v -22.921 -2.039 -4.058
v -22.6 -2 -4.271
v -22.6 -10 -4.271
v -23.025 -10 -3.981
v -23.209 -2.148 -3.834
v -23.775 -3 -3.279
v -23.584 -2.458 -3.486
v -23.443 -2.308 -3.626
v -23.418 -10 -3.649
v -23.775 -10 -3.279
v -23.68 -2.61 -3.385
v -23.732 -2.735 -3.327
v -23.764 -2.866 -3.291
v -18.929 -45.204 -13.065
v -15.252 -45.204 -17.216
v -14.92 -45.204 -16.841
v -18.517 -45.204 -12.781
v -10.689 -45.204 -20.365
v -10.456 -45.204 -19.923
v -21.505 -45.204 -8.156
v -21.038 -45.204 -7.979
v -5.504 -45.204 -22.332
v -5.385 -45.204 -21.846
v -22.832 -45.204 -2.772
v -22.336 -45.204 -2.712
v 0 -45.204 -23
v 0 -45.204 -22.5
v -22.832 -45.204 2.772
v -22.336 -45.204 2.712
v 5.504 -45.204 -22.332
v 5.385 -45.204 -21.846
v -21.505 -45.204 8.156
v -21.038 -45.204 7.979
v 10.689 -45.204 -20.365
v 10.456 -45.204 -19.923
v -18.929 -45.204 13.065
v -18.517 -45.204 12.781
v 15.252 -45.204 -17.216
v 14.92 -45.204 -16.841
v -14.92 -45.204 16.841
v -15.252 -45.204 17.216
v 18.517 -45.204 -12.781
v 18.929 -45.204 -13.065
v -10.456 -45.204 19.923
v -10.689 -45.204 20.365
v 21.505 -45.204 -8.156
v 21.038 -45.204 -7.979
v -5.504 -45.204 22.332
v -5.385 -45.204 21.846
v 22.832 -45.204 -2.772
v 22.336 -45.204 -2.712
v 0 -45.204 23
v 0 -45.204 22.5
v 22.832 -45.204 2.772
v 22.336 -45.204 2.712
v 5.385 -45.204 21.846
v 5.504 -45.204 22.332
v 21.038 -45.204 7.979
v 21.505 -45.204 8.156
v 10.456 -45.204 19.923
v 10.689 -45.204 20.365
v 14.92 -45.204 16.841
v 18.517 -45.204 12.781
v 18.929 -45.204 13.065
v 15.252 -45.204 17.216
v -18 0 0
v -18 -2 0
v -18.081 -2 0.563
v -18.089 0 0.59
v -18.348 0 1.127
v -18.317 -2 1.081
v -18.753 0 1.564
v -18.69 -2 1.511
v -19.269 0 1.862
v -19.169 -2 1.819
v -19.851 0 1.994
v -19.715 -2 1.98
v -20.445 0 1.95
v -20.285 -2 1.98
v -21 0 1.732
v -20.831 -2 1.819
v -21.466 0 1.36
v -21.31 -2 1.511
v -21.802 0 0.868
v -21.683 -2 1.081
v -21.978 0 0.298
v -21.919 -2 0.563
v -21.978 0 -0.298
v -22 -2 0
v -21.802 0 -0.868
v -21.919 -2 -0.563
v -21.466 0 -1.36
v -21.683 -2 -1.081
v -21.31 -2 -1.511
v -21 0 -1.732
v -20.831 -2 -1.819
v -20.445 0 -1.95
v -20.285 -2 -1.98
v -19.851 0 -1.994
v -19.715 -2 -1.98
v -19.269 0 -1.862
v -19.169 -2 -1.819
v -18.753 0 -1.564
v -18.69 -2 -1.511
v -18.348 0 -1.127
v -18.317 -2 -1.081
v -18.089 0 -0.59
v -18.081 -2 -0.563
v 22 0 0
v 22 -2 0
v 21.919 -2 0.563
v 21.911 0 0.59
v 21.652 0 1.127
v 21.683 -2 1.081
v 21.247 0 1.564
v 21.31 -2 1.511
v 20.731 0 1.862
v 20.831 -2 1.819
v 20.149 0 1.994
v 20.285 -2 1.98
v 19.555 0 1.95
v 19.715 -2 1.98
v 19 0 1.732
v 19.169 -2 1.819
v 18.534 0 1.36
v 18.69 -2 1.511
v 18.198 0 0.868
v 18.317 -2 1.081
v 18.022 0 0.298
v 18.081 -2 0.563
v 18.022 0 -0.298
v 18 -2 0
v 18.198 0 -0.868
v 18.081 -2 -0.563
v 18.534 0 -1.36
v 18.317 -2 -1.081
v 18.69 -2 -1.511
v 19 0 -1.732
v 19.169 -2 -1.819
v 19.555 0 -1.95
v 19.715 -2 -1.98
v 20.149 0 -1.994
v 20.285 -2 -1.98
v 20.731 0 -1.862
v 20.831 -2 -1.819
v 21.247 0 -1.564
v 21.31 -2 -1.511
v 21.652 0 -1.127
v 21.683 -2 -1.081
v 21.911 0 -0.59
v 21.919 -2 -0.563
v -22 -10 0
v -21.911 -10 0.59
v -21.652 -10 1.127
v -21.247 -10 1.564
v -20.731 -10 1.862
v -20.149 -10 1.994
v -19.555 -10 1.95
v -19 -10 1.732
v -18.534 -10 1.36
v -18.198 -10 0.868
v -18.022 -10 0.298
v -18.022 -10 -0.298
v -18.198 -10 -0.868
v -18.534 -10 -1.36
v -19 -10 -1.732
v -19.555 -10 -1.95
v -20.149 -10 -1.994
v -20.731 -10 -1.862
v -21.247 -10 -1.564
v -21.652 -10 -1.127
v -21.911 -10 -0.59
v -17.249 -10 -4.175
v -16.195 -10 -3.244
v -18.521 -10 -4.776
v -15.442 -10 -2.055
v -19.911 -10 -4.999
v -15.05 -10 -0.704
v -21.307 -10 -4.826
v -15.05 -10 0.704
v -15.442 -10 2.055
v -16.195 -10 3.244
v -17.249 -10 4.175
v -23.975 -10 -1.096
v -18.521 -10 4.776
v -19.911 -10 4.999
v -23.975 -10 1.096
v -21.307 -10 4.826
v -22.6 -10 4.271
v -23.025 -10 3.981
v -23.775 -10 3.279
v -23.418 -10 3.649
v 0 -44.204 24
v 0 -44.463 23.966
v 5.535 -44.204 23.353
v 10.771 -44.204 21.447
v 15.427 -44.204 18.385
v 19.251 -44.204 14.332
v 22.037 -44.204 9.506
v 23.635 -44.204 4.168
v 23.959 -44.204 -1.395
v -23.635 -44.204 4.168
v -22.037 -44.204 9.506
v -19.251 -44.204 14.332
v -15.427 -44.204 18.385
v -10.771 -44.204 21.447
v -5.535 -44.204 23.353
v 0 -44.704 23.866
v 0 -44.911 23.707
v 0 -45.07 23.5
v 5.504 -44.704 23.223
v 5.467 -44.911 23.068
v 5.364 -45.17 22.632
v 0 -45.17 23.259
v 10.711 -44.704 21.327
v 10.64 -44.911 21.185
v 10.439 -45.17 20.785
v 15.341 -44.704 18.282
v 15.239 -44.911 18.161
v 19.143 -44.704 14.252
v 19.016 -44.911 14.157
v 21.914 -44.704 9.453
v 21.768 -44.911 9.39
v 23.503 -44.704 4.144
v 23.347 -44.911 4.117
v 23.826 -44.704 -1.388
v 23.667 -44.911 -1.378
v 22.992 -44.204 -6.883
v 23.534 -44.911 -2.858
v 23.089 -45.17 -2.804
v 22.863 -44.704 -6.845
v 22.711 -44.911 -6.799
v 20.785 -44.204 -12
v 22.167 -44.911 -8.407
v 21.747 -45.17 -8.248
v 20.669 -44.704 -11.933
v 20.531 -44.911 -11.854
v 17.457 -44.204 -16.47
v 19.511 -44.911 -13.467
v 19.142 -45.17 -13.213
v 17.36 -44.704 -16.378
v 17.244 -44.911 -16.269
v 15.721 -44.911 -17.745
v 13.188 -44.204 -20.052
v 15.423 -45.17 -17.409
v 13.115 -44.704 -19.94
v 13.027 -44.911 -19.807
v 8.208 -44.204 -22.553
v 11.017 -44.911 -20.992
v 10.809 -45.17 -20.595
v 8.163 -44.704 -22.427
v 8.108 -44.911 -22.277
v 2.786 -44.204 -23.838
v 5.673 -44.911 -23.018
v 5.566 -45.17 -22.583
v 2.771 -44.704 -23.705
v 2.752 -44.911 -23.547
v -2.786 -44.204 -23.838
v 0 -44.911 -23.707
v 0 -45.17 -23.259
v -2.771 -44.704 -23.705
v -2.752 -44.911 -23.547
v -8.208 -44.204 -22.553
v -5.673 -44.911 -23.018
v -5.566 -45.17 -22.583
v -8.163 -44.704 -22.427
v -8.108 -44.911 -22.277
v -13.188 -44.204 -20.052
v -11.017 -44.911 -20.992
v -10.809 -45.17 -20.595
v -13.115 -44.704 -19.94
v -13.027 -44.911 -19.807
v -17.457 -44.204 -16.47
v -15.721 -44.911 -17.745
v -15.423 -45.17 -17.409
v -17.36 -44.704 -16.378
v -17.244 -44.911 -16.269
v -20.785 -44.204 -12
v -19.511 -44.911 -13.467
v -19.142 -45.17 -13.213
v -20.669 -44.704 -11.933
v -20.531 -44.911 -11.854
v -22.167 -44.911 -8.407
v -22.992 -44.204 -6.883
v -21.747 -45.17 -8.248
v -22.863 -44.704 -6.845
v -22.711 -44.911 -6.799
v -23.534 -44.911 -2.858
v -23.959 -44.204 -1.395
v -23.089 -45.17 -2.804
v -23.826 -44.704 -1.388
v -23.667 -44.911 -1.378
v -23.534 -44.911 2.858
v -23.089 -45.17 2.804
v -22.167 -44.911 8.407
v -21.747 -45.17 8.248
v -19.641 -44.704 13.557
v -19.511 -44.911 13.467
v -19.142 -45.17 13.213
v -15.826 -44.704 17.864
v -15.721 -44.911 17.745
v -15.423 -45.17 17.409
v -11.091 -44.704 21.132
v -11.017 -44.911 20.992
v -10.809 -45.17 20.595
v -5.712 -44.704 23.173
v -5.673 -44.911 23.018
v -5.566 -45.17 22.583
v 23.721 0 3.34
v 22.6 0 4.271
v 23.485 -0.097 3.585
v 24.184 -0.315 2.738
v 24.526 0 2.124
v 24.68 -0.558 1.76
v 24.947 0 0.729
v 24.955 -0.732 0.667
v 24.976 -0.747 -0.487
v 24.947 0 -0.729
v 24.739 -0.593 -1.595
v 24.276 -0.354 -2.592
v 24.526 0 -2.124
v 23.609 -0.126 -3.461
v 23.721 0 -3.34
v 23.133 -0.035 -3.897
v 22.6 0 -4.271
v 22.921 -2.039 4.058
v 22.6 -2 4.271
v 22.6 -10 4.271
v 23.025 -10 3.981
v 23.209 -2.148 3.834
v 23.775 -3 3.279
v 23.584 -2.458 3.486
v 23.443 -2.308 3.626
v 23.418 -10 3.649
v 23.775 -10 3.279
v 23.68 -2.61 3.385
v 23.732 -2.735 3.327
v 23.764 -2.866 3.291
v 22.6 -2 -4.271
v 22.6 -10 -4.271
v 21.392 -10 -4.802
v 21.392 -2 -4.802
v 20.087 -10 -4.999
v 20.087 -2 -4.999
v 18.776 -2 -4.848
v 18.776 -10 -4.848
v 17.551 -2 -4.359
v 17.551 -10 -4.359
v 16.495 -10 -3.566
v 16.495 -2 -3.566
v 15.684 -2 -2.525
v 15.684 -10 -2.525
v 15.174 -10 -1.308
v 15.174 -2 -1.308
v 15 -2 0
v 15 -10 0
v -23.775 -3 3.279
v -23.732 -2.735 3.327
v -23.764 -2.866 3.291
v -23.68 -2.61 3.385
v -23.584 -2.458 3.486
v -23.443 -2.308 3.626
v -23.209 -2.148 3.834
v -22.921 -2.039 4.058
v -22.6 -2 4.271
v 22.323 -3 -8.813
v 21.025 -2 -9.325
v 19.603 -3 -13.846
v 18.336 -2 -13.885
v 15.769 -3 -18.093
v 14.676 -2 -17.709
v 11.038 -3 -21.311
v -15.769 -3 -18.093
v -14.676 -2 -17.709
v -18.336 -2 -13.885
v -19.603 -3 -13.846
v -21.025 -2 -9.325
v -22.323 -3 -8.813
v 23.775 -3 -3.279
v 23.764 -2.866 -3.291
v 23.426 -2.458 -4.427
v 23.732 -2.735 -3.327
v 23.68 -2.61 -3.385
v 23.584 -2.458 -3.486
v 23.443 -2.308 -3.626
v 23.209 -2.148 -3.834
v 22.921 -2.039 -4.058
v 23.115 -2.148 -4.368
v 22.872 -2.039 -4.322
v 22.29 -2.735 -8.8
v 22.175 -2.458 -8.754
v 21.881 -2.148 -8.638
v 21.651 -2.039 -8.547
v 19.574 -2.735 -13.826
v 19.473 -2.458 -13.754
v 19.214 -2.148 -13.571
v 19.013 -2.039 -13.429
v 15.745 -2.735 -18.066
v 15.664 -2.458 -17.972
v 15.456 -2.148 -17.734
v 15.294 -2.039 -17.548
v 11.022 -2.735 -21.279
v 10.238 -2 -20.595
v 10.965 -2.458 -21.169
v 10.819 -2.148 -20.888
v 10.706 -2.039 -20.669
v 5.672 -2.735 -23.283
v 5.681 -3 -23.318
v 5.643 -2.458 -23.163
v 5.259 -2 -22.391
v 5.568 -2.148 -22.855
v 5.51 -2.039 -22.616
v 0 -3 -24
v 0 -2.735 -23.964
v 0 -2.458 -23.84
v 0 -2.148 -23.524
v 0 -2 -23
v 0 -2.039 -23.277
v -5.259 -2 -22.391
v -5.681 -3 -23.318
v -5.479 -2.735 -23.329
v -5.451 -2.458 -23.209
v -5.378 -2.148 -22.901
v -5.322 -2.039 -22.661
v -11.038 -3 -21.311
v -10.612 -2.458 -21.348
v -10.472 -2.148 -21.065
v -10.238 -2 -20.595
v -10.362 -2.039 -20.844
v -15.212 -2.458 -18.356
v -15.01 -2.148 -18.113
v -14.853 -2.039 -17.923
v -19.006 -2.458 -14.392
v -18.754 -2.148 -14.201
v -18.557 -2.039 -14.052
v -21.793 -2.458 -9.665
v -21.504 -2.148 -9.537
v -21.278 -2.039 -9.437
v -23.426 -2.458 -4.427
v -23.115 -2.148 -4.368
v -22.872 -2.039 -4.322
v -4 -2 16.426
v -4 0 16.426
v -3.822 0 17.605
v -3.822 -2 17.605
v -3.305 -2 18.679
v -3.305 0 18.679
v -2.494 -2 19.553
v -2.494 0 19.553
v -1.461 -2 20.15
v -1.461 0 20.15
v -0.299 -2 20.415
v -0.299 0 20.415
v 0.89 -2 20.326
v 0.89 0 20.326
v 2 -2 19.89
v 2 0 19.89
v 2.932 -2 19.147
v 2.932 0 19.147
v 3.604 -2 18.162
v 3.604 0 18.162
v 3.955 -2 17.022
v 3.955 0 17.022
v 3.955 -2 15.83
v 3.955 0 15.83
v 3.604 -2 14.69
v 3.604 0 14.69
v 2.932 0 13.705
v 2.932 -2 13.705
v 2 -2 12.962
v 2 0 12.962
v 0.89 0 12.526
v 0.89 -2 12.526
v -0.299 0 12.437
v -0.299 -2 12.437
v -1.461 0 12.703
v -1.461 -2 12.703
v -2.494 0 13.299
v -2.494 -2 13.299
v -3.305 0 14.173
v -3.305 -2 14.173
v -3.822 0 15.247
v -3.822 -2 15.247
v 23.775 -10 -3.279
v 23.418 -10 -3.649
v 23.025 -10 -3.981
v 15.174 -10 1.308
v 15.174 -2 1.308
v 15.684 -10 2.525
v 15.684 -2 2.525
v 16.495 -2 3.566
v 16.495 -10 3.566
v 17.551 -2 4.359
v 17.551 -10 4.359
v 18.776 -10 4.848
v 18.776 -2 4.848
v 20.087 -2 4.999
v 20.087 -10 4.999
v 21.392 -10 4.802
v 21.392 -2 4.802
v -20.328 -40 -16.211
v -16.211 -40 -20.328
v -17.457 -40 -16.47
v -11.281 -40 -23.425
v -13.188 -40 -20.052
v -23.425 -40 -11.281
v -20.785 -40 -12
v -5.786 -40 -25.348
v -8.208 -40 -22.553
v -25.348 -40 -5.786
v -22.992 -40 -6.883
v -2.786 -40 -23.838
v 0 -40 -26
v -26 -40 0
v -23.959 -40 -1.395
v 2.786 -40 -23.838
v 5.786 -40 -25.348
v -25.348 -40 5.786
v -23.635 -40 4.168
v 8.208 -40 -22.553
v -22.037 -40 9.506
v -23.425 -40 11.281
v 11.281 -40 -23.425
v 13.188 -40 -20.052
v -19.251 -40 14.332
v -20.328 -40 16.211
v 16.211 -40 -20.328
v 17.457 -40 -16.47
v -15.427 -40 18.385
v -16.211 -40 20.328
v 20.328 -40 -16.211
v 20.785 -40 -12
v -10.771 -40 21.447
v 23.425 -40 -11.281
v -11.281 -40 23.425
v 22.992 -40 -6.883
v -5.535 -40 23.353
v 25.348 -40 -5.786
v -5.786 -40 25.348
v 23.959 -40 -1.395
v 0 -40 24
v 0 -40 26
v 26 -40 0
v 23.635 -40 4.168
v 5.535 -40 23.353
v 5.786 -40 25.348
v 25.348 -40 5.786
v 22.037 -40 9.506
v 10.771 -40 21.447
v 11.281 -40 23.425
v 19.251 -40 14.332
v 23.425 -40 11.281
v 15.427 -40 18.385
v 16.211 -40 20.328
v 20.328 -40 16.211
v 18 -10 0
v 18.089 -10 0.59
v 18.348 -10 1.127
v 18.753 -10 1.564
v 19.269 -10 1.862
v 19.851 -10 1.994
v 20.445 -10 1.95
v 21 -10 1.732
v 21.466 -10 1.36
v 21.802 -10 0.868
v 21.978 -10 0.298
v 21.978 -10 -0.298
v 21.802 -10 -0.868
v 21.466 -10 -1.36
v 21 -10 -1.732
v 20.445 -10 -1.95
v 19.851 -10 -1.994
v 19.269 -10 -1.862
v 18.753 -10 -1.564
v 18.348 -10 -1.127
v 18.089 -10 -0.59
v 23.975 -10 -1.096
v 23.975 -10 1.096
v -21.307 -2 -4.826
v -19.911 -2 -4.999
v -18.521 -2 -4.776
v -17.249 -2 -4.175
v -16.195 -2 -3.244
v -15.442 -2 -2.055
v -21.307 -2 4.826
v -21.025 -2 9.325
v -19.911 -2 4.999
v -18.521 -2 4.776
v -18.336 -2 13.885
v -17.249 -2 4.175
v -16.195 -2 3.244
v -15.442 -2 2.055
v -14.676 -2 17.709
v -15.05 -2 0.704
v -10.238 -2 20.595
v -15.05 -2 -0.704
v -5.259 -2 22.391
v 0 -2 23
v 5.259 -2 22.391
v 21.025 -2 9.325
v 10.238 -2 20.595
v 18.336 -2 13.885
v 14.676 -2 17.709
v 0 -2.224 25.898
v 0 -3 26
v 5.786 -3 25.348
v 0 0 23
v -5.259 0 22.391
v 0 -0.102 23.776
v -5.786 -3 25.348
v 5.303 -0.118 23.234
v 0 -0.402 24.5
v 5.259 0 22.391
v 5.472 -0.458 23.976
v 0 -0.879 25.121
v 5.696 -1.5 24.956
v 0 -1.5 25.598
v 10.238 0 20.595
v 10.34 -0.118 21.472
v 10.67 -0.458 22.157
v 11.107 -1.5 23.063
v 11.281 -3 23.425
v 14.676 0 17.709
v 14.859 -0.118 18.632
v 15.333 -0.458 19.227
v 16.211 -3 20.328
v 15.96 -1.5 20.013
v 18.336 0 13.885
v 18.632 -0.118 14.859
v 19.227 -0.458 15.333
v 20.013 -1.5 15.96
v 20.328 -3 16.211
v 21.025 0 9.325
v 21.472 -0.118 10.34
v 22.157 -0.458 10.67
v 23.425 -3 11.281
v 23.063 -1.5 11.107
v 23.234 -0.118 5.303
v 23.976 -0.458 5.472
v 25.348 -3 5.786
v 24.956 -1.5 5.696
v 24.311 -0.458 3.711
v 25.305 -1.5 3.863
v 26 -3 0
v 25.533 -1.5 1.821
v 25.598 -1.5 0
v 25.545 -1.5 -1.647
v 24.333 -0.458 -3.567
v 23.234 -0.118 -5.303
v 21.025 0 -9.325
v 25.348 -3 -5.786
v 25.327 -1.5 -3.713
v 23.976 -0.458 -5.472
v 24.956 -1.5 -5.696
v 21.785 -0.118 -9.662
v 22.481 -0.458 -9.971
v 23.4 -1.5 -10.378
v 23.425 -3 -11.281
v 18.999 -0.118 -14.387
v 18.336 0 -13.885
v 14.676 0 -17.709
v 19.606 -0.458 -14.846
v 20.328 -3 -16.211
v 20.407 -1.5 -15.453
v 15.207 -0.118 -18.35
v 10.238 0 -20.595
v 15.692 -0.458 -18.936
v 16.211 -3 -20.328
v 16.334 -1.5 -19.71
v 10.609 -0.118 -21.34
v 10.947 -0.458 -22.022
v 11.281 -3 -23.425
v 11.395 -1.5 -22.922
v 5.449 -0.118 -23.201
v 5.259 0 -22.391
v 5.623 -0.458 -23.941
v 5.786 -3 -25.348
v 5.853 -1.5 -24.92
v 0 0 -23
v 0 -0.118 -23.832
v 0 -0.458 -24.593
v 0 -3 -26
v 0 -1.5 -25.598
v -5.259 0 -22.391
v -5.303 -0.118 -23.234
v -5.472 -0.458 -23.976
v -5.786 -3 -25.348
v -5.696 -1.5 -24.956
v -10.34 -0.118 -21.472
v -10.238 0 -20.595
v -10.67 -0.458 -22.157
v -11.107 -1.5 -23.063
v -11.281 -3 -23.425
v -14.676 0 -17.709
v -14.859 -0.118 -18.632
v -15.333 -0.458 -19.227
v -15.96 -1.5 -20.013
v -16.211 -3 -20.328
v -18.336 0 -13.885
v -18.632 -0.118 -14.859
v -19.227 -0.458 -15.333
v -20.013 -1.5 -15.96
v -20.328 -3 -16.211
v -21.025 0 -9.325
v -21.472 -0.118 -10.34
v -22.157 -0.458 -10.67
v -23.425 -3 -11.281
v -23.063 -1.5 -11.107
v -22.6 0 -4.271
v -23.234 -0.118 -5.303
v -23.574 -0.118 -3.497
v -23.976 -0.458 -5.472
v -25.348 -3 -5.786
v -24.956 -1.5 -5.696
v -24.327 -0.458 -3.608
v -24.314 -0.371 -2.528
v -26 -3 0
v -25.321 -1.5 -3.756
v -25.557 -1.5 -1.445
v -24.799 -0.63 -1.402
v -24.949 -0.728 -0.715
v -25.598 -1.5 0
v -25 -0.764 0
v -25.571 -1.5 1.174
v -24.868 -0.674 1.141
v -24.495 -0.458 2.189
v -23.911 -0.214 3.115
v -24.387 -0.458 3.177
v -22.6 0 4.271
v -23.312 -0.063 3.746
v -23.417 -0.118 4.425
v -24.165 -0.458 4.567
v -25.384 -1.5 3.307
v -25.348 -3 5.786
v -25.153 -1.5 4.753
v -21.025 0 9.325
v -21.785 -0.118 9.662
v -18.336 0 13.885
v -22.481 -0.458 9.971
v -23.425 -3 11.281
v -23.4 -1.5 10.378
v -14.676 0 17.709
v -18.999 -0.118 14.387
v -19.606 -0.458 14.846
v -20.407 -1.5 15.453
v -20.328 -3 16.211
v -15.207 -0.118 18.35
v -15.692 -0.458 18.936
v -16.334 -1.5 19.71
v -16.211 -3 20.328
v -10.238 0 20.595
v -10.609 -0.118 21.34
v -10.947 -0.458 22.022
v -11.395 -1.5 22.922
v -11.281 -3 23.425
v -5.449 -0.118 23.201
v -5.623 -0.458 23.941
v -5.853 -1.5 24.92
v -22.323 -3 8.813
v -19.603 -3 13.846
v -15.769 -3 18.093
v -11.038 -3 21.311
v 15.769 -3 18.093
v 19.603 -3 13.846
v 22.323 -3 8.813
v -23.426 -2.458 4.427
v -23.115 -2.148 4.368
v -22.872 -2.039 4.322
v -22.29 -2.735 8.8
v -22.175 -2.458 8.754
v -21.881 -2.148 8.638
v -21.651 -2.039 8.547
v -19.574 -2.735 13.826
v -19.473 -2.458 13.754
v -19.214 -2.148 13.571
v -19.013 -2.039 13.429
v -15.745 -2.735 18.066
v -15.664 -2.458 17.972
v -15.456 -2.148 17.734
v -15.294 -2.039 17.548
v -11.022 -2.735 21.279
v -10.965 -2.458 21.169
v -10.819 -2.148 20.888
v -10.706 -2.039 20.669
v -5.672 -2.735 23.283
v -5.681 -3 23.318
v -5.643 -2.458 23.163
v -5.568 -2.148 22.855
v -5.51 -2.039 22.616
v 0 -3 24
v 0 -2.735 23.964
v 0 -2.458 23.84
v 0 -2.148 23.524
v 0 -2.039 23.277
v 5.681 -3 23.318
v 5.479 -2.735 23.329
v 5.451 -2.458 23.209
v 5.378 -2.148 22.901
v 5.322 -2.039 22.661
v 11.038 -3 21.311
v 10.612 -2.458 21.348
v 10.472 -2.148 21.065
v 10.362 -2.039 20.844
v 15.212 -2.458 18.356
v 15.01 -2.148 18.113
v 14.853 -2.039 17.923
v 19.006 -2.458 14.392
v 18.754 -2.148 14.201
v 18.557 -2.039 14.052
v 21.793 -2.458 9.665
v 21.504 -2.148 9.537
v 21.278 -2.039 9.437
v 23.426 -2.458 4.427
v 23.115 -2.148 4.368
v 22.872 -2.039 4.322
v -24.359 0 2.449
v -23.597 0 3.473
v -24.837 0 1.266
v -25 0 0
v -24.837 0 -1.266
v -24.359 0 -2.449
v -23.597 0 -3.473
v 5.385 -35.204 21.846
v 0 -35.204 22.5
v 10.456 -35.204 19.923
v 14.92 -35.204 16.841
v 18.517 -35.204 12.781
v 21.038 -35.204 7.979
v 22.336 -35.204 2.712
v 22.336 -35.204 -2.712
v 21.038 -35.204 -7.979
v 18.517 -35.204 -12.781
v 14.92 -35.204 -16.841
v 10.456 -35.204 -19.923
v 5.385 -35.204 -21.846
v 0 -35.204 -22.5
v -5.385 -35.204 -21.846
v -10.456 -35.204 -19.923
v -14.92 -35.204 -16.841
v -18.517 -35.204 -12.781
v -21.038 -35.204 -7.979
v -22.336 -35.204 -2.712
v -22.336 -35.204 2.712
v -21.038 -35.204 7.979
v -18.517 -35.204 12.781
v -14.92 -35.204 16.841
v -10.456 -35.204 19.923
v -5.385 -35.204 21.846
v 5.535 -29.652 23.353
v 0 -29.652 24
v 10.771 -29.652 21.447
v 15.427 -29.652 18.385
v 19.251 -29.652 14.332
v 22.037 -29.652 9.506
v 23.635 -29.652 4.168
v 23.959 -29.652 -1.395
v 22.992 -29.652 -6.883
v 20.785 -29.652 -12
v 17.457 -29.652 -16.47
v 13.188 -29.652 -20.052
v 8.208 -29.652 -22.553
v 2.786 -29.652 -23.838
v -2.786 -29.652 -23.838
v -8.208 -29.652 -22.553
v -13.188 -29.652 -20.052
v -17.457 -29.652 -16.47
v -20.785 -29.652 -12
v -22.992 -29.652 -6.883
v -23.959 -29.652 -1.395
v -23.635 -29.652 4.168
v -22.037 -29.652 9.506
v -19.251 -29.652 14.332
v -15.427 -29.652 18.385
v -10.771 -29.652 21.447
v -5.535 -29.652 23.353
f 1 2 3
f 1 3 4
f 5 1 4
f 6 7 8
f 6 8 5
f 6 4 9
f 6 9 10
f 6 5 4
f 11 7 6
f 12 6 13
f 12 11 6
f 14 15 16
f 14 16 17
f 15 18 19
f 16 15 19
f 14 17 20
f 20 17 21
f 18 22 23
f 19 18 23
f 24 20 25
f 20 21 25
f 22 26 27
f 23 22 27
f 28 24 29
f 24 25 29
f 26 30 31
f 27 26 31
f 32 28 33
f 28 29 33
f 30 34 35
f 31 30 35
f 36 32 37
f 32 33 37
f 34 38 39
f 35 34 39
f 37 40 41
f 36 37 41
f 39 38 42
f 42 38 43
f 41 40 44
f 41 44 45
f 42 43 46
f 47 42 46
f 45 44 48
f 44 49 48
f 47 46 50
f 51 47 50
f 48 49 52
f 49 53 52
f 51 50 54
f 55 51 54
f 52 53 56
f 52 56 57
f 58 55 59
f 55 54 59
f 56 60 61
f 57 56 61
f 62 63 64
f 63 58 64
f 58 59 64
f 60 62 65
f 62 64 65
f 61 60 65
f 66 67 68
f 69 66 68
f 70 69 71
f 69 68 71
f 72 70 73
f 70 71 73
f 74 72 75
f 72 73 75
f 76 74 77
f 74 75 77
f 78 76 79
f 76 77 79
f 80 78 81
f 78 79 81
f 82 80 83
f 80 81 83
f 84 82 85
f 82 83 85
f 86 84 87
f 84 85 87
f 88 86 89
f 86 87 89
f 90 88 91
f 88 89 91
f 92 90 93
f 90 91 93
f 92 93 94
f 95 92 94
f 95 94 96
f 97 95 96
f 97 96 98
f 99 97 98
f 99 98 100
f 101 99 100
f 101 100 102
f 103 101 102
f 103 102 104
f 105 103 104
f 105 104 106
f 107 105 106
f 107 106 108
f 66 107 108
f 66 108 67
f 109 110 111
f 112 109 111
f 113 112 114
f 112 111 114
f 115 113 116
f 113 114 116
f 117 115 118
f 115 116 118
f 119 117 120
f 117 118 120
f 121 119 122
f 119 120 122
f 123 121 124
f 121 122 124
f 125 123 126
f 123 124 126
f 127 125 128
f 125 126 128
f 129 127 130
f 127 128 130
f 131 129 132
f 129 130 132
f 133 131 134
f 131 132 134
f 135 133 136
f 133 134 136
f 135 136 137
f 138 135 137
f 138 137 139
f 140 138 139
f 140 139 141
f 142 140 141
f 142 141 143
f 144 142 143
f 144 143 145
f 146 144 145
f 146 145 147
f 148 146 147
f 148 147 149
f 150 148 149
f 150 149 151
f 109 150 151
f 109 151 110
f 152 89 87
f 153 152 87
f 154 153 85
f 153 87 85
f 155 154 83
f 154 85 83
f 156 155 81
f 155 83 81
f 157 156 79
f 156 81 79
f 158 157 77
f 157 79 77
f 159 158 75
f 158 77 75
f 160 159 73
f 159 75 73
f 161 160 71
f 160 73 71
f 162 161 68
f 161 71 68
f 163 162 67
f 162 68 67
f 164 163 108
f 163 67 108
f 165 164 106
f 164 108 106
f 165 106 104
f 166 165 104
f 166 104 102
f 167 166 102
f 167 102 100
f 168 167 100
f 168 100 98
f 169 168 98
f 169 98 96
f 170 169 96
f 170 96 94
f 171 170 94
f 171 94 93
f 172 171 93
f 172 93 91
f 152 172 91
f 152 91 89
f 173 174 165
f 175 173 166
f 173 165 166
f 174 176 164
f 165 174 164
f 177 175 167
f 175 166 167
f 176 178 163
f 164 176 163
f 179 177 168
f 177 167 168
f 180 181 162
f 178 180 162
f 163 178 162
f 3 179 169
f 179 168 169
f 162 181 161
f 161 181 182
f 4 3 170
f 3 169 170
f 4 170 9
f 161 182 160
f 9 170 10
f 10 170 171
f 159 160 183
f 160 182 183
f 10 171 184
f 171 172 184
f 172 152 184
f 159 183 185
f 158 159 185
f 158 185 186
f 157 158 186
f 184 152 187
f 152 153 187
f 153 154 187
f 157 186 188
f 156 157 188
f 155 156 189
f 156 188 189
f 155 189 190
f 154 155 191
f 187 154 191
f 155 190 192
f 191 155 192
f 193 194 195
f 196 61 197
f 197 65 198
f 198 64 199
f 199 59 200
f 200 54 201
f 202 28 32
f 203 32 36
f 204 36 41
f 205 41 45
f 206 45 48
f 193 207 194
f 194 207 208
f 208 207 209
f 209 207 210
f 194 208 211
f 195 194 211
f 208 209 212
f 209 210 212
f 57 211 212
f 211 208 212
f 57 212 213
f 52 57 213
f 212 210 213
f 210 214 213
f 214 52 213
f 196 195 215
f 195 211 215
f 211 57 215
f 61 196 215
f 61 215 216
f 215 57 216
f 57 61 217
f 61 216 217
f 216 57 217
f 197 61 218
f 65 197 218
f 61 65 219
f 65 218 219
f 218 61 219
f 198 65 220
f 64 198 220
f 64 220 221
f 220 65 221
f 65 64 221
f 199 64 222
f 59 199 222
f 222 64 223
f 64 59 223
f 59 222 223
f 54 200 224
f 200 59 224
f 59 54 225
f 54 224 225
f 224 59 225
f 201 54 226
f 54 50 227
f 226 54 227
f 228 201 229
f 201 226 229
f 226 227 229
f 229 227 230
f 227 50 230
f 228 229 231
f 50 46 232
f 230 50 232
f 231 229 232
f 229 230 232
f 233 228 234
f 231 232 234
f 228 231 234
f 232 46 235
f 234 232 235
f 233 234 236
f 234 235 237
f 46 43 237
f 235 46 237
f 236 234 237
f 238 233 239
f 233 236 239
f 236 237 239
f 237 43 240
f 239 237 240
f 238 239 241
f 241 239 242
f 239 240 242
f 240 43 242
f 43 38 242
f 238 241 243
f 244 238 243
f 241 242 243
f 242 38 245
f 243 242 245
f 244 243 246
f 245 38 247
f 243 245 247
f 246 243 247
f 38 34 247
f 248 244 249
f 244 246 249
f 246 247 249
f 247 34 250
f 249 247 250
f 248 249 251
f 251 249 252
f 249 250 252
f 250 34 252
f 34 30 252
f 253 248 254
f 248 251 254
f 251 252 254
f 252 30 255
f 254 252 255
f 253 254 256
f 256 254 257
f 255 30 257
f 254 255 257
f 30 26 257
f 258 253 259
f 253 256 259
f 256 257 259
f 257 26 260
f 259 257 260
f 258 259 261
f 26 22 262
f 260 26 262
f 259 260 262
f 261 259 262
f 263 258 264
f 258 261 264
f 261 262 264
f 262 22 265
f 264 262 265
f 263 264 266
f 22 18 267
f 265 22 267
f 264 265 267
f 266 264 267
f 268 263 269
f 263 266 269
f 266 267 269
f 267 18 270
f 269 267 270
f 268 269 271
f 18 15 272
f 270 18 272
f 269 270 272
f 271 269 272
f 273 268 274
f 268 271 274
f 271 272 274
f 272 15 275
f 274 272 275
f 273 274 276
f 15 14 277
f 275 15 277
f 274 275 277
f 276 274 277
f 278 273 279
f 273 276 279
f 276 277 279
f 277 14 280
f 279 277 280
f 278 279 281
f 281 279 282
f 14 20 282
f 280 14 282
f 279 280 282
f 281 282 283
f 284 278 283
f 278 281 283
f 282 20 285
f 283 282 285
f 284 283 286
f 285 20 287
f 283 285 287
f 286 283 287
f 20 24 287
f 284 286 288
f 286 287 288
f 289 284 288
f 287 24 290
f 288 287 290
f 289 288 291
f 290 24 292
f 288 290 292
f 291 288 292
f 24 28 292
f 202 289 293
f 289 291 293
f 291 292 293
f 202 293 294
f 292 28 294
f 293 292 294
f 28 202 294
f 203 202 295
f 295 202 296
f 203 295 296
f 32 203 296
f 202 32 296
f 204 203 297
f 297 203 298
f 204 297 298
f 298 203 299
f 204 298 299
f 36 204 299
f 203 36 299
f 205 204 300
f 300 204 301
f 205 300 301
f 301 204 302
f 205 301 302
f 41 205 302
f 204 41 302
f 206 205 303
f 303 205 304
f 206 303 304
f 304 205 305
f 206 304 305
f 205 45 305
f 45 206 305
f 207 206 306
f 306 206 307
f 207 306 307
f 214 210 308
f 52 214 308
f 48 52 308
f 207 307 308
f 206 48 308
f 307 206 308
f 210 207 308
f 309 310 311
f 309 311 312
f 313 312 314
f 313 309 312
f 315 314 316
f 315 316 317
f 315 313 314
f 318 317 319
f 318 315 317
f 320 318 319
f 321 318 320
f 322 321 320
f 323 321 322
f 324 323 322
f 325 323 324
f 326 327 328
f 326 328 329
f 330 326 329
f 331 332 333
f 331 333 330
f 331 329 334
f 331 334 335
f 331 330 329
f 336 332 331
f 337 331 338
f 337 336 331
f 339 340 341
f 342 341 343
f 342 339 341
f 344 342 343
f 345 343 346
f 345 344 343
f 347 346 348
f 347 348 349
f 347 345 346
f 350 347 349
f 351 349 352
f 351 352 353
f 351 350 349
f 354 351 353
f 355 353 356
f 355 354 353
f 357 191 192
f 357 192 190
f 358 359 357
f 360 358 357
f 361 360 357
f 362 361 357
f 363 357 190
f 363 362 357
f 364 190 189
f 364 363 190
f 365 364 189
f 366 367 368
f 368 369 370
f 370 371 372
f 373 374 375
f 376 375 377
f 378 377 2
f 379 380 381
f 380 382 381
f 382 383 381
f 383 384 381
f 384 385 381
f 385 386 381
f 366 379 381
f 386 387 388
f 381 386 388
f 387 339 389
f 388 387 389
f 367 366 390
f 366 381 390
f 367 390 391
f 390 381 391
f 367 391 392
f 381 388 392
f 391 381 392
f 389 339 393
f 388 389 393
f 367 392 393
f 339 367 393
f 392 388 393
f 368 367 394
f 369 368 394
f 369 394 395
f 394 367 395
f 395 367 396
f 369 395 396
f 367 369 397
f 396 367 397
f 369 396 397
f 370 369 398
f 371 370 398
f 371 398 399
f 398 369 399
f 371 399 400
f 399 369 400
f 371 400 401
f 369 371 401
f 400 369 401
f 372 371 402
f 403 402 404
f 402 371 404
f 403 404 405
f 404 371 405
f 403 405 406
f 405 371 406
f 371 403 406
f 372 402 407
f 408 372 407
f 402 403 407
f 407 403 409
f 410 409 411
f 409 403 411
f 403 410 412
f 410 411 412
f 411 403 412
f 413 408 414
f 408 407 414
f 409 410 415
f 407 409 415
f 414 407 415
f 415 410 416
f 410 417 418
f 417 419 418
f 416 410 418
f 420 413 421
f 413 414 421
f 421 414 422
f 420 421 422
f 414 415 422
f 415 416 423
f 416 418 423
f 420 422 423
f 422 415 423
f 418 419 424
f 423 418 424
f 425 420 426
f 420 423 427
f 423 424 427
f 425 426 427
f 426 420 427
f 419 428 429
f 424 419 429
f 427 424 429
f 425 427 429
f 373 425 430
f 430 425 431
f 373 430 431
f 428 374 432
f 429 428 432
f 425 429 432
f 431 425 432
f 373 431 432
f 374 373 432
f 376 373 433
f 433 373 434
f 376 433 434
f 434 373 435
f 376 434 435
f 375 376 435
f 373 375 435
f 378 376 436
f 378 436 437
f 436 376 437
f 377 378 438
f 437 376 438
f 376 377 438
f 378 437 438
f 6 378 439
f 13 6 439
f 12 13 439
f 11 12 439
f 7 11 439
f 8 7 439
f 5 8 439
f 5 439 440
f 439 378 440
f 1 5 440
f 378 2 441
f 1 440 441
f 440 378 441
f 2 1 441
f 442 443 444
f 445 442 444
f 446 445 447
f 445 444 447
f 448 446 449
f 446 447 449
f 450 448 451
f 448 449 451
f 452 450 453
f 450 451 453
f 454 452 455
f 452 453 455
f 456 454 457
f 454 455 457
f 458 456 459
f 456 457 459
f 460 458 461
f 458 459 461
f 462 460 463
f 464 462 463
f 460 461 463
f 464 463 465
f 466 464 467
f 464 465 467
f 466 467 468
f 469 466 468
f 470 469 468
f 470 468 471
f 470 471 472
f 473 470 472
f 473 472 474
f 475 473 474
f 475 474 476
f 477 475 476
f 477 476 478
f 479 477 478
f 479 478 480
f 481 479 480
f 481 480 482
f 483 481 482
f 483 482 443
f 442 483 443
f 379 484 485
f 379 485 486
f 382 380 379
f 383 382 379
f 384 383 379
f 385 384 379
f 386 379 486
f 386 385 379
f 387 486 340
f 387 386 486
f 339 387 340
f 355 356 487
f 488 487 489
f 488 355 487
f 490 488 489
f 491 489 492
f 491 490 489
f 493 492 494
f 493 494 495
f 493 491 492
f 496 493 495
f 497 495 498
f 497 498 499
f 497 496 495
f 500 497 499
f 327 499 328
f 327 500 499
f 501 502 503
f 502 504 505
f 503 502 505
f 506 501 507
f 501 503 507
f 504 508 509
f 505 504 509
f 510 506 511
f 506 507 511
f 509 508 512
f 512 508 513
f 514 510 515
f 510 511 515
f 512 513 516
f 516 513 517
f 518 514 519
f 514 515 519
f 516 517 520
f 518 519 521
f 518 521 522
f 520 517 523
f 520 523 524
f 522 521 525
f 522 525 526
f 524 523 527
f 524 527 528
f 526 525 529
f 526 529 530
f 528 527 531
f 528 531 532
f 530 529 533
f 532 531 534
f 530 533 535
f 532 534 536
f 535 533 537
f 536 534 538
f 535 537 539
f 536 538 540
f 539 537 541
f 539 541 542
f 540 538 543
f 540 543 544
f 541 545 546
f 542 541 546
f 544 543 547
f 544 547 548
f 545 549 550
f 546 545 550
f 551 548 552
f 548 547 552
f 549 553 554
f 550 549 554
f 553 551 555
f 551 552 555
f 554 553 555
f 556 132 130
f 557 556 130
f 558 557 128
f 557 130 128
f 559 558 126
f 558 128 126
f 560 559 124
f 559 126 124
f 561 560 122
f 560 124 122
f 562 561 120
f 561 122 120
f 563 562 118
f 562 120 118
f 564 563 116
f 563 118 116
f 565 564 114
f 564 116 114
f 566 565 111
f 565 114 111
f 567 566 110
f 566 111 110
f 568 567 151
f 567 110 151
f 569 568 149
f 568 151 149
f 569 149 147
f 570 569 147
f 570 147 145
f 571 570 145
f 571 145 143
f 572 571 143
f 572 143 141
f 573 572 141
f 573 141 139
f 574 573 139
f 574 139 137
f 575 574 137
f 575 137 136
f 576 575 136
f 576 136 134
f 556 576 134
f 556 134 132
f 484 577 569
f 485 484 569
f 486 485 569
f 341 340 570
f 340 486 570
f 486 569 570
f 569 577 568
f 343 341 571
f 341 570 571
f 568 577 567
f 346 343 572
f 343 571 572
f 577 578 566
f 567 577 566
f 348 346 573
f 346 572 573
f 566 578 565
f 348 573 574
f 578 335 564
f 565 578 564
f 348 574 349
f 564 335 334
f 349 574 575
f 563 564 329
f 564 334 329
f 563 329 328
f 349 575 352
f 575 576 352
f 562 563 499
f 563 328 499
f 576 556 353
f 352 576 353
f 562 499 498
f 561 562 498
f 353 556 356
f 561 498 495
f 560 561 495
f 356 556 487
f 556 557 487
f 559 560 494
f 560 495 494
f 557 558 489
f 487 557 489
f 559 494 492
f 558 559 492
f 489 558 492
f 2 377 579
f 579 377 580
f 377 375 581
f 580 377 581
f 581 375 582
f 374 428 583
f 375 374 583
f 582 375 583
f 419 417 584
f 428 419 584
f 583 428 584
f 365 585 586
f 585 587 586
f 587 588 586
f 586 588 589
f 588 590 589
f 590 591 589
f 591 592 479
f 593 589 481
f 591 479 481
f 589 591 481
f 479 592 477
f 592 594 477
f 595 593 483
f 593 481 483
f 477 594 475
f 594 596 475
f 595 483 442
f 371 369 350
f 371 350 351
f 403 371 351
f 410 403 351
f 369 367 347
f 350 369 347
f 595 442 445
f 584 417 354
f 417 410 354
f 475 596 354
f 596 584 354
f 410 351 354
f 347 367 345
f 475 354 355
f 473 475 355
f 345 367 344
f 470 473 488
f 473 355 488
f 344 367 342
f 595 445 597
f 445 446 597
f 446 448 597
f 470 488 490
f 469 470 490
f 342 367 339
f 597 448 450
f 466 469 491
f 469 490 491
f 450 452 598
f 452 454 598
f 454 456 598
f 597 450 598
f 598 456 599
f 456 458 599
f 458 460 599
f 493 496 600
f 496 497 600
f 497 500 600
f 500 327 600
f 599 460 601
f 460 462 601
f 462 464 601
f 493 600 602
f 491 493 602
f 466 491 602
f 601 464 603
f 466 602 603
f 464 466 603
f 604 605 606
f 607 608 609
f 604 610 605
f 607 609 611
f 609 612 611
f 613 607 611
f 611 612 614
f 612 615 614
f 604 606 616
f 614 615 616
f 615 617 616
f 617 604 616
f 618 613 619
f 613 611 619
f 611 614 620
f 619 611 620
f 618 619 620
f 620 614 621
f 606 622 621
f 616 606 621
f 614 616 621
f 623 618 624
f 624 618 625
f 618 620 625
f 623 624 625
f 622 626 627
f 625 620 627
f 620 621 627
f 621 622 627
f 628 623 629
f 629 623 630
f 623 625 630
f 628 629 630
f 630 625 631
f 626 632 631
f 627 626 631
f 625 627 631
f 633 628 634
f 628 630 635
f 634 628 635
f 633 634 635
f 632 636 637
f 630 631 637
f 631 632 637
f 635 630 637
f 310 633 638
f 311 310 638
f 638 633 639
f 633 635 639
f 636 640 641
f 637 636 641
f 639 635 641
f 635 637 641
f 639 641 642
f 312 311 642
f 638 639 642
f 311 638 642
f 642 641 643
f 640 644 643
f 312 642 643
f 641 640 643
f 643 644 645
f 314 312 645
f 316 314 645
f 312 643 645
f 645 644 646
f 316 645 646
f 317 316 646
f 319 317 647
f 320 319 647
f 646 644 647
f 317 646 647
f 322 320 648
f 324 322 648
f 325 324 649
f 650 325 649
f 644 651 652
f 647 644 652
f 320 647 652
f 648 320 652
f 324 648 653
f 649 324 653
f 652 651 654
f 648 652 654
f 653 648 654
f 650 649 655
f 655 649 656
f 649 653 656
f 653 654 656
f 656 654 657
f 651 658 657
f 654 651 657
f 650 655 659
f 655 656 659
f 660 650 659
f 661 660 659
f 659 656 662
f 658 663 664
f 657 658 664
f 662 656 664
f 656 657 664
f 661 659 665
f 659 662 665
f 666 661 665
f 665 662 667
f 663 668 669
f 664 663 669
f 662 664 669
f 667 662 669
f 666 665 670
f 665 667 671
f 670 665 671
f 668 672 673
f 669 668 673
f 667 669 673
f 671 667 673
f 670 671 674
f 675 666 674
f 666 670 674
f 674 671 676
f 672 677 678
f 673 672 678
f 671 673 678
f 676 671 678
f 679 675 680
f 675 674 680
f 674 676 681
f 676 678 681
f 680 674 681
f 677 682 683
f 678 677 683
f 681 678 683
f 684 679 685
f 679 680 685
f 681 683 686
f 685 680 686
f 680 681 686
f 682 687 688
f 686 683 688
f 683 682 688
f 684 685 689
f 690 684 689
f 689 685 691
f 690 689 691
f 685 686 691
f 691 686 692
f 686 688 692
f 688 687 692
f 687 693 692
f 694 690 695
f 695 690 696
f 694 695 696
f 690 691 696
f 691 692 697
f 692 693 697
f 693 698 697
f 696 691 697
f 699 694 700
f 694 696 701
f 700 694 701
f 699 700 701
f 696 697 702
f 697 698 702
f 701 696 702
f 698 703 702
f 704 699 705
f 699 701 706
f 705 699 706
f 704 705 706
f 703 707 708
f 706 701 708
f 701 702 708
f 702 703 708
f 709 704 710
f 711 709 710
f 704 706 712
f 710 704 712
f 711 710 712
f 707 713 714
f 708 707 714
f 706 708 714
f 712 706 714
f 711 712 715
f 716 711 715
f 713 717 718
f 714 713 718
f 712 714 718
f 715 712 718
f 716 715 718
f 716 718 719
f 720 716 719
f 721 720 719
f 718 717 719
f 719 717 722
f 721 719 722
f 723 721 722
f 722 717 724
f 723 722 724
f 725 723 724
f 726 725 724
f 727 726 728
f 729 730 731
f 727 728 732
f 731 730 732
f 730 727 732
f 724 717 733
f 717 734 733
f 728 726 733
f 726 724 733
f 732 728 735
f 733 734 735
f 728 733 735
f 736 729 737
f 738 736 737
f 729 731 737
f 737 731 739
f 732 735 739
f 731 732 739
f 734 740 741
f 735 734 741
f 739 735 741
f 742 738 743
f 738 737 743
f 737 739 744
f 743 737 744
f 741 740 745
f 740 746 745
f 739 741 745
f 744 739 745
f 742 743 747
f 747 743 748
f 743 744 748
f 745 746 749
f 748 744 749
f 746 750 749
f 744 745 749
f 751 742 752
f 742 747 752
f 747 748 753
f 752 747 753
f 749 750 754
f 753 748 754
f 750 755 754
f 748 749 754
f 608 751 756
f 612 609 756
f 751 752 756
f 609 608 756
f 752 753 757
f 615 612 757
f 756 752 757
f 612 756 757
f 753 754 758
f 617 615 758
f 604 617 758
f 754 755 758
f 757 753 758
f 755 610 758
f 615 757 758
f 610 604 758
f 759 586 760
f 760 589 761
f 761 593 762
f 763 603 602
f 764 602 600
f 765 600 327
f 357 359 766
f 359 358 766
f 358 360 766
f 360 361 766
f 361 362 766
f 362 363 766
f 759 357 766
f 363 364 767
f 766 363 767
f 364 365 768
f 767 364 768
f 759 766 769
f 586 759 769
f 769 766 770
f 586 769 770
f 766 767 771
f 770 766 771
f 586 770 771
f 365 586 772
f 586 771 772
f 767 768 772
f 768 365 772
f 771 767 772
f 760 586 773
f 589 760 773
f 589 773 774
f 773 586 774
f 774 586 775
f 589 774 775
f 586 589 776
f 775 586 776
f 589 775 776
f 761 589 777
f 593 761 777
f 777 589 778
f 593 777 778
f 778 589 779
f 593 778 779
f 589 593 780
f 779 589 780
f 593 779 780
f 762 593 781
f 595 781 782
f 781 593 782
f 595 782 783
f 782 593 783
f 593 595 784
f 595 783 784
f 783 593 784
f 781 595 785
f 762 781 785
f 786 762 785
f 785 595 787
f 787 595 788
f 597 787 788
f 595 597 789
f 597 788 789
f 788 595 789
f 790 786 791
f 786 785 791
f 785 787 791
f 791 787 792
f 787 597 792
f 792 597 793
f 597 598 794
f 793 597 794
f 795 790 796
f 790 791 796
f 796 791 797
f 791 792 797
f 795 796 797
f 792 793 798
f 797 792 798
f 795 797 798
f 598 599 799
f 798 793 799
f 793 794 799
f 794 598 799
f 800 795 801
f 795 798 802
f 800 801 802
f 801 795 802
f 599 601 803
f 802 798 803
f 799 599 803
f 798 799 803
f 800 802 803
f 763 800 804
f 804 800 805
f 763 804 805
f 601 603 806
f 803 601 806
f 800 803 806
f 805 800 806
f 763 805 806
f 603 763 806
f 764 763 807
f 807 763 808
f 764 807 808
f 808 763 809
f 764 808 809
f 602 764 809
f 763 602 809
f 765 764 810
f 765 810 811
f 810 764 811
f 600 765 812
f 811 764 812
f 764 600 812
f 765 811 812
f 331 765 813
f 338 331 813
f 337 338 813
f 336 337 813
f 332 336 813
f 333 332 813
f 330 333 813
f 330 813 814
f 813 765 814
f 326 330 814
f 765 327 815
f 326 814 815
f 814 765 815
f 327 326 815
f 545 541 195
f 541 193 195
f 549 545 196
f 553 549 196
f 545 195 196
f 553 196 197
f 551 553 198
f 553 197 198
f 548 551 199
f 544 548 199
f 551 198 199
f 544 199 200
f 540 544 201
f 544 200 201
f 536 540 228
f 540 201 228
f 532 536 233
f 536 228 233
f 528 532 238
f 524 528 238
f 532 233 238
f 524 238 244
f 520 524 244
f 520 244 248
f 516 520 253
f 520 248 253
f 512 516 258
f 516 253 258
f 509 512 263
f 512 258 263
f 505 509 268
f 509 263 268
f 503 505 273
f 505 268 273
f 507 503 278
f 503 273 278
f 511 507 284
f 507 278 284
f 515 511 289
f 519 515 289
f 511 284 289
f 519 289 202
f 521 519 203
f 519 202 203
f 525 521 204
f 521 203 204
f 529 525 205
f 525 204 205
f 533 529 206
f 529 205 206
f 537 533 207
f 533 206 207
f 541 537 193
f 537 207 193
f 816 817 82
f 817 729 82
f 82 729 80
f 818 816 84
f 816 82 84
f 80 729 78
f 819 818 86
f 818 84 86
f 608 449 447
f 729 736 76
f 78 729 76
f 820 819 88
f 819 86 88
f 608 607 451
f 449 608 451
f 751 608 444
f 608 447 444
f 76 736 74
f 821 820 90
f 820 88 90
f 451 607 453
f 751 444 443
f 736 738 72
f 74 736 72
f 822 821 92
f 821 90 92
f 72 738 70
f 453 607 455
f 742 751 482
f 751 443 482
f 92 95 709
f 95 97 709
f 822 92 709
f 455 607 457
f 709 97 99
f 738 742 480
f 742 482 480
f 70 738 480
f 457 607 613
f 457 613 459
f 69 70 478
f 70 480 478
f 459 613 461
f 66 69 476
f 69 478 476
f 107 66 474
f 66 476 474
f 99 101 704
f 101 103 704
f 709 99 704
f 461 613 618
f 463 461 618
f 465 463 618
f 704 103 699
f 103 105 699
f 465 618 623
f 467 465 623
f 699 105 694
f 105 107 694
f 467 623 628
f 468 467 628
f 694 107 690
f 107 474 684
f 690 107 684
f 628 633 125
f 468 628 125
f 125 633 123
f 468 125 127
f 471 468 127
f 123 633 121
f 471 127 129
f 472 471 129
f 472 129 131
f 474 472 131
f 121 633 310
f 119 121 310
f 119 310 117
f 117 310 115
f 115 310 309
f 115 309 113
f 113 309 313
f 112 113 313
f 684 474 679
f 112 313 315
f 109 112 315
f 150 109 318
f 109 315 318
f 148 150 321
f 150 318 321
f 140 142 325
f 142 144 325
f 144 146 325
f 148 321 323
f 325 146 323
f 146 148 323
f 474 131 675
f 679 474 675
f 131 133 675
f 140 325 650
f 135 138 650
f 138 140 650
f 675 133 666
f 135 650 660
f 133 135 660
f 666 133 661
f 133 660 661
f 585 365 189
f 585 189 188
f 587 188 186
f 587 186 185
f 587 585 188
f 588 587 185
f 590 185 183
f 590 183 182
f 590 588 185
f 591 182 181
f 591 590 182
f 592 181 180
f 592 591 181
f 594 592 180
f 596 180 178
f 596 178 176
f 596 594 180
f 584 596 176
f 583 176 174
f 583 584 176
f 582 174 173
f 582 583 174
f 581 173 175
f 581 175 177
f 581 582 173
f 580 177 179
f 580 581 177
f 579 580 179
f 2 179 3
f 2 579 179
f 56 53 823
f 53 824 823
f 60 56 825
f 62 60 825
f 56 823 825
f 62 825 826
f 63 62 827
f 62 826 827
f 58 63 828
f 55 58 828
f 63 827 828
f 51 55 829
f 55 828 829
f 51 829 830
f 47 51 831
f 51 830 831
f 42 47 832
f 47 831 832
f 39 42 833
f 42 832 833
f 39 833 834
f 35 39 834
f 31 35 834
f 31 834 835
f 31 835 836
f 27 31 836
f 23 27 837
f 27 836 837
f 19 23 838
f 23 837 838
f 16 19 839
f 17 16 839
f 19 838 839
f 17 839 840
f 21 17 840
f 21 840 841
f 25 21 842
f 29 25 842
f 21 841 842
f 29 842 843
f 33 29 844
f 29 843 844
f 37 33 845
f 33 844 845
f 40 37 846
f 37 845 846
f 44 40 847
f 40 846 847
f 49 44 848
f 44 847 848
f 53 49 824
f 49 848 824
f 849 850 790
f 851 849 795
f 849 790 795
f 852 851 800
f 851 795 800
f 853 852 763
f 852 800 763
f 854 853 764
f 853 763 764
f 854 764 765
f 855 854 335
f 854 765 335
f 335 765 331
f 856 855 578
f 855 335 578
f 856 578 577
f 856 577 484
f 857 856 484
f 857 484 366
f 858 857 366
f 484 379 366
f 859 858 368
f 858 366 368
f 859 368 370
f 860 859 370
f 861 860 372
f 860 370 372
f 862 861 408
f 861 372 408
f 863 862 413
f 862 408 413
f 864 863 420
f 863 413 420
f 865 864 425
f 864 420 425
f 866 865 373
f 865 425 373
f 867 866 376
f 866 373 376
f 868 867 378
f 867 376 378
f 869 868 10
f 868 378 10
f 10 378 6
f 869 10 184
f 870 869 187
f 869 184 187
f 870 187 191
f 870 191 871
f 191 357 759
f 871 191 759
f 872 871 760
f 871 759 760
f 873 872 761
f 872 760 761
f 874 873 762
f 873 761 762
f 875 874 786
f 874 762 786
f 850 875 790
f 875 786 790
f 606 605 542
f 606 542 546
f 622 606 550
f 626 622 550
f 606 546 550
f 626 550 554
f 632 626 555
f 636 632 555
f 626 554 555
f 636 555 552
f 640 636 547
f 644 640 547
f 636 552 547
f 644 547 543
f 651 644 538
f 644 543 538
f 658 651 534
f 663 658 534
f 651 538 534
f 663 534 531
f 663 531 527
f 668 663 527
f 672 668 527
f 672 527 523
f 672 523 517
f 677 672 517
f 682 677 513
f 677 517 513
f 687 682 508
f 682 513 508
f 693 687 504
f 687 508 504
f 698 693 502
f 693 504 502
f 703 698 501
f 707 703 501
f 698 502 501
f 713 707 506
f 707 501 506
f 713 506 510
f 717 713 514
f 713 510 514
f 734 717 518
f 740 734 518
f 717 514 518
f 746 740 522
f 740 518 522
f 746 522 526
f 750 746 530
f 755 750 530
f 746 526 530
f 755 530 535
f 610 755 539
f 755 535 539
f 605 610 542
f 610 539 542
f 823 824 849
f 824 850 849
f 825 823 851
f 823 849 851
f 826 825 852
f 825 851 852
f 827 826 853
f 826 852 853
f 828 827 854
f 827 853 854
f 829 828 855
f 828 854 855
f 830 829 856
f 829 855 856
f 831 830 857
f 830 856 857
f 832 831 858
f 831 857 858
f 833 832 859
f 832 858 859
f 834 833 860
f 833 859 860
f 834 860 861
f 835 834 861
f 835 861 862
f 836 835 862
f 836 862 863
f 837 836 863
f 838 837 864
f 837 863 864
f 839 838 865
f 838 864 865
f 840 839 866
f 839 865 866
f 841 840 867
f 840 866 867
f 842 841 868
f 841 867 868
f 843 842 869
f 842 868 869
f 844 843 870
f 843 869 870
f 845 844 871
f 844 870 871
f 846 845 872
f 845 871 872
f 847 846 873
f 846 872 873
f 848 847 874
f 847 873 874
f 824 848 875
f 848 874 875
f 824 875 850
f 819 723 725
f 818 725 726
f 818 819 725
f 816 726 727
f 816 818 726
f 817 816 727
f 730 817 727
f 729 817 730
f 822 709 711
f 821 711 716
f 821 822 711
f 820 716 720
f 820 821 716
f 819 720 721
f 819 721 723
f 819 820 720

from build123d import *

# Parameters (mm, degrees)
F2_R      = 2
F3_DEPTH  = 10
F3_FACE_R = 2
F2_R_2    = 5
F2_R_3    = 4
F4_DEPTH  = 7.6
F5_DEPTH  = 25


with BuildPart() as f1:
    # F0 (on Right) → F1 (revolve)
    with BuildSketch(Plane.YZ):
        with BuildLine():
            Line((-2, 0), (0, 0))
            Line((0, 0), (0, 23))
            ThreePointArc((0, 23), (-0.8786796564, 25.1213203436), (-3, 26))
            Line((-3, 26), (-40, 26))
            Line((-40, 26), (-40, 24))
            Line((-40, 24), (-44.203865394, 24))
            ThreePointArc((-44.203865394, 24), (-44.9109721752, 23.7071067812), (-45.203865394, 23))
            Line((-45.203865394, 23), (-45.203865394, 22.5))
            Line((-45.203865394, 22.5), (-35.203865394, 22.5))
            Line((-35.203865394, 22.5), (-29.6515244991, 24))
            Line((-29.6515244991, 24), (-3, 24))
            ThreePointArc((-3, 24), (-2.2928932188, 23.7071067812), (-2, 23))
            Line((-2, 23), (-2, 0))
        make_face()
    revolve(axis=Axis((0, -18.7915153801, 0), (0, 1, 0)))

    # F2 (on face) → F3 (join)
    with BuildSketch(Plane(origin=(0, 0, 0), x_dir=(-1, 0, 0), z_dir=(0, 1, 0))):
        with BuildLine():
            ThreePointArc((22.6, -4.2708313008), (24.3588989435, -2.4494897428), (25, 0))
            ThreePointArc((25, 0), (24.3588989435, 2.4494897428), (22.6, 4.2708313008))
            ThreePointArc((22.6, 4.2708313008), (22.8997816583, 2.144761059), (23, 0))
            ThreePointArc((23, 0), (22.8997816583, -2.144761059), (22.6, -4.2708313008))
        make_face()
        with BuildLine():
            ThreePointArc((23, 0), (22.8997816583, 2.144761059), (22.6, 4.2708313008))
            ThreePointArc((22.6, 4.2708313008), (15, 0), (22.6, -4.2708313008))
            ThreePointArc((22.6, -4.2708313008), (22.8997816583, -2.144761059), (23, 0))
        make_face()
        with Locations((20, 0)):
            Circle(F2_R, mode=Mode.SUBTRACT)
        with BuildLine():
            ThreePointArc((-15, 0), (-17.5505102572, 4.3588989435), (-22.6, 4.2708313008))
            ThreePointArc((-22.6, 4.2708313008), (-23, 0), (-22.6, -4.2708313008))
            ThreePointArc((-22.6, -4.2708313008), (-17.5505102572, -4.3588989435), (-15, 0))
        make_face()
        with Locations((-20, 0)):
            Circle(F2_R, mode=Mode.SUBTRACT)
        with BuildLine():
            ThreePointArc((-22.6, -4.2708313008), (-23, 0), (-22.6, 4.2708313008))
            ThreePointArc((-22.6, 4.2708313008), (-25, 0), (-22.6, -4.2708313008))
        make_face()
    extrude(amount=-F3_DEPTH)

    # F3_face (on face) + F2 (on face) + F3_face1 (on face) → F4 (cut)
    with BuildSketch(Plane(origin=(-20, -2, 0), x_dir=(1, 0, 0), z_dir=(0, -1, 0))):
        Circle(F3_FACE_R)
        with Locations((40, 0)):
            Circle(F3_FACE_R)
    with BuildSketch(Plane(origin=(0, 0, 0), x_dir=(-1, 0, 0), z_dir=(0, 1, 0))):
        with Locations((20, 0)):
            Circle(F2_R_2)
        with Locations((20, 0)):
            Circle(F2_R, mode=Mode.SUBTRACT)
        with Locations((-20, 0)):
            Circle(F2_R_2)
        with Locations((-20, 0)):
            Circle(F2_R, mode=Mode.SUBTRACT)
        with Locations((0, 16.4260324091)):
            Circle(F2_R_3)
    with BuildSketch(Plane(origin=(0, 0, 0), x_dir=(-1, 0, 0), z_dir=(0, 1, 0))):
        with BuildLine():
            ThreePointArc((0, 23), (-14.6760158095, 17.7091659871), (-22.6, 4.2708313008))
            ThreePointArc((-22.6, 4.2708313008), (-25, 0), (-22.6, -4.2708313008))
            ThreePointArc((-22.6, -4.2708313008), (0, -23), (22.6, -4.2708313008))
            ThreePointArc((22.6, -4.2708313008), (25, 0), (22.6, 4.2708313008))
            ThreePointArc((22.6, 4.2708313008), (14.6760158095, 17.7091659871), (0, 23))
        make_face()
    extrude(amount=-F4_DEPTH, dir=(0, -1, 0), mode=Mode.SUBTRACT)

    # F2 (on face) → F5 (cut)
    with BuildSketch(Plane(origin=(0, 0, 0), x_dir=(-1, 0, 0), z_dir=(0, 1, 0))):
        with Locations((0, 16.4260324091)):
            Circle(F2_R_3)
    extrude(amount=-F5_DEPTH, mode=Mode.SUBTRACT)


solid = f1.part
